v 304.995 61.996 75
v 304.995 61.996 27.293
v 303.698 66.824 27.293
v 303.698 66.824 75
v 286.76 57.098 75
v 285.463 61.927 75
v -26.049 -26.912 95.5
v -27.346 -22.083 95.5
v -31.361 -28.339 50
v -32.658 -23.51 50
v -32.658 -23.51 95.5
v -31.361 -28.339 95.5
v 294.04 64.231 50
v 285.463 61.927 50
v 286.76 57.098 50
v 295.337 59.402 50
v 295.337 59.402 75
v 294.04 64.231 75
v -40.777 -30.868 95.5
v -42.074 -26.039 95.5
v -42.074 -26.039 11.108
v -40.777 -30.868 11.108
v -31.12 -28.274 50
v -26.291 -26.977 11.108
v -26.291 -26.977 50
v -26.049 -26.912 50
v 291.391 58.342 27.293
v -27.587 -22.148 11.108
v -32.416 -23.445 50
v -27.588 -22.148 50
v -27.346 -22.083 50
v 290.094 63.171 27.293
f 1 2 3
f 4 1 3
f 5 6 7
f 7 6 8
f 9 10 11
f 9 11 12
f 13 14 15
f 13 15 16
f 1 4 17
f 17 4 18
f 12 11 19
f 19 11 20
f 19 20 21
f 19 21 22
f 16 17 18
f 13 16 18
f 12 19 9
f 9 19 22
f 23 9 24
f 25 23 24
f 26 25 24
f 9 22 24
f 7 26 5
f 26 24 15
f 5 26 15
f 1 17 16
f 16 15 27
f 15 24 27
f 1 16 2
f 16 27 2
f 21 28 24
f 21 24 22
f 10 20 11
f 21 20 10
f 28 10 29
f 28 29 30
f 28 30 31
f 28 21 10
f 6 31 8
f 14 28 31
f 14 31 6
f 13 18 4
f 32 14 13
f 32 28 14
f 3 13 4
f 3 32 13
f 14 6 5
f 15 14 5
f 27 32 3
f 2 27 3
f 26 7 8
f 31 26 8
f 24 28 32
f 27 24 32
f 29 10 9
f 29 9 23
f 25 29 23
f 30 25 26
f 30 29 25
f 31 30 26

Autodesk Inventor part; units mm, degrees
ref_plane "YZ Plane" through (0, 0, 0) normal (1, 0, 0) x (0, 1, 0)
ref_plane "XZ Plane" through (0, 0, 0) normal (0, 1, 0) x (-1, 0, 0)
sketch "Sketch1" plane through (0, 0, 0) normal (0, 0, 1) x (1, 0, 0)
  line L0 (-63.5719, 111.8382) -> (-7.6155, -96.5129) construction
  line L1 (-12.4444, -97.8098) -> (-68.7777, 111.945) construction
  line L2 (-42.0741, -26.0387) -> (-40.7772, -30.8676)
  line L3 (-40.7772, -30.8676) -> (304.995, 61.9956)
  line L4 (304.995, 61.9956) -> (303.6981, 66.8245)
  line L5 (-23.1781, -38.5663) -> (-40.7772, -30.8676) construction
  line L6 (247.1858, -96.9584) -> (307.8088, 111.597) construction
  line L7 (-42.0741, -26.0387) -> (-32.4163, -23.445) construction
  line L8 (294.0403, 64.2307) -> (303.6981, 66.8245) construction
  line L9 (-42.0741, -26.0387) -> (303.6981, 66.8245)
  point P0 (0, 0)
extrude "Extrusion1" add sketch "Sketch1" along normal blind 100
ref_plane "Work Plane1" through (0, 0, 50) normal (0, 0, 1) x (1, 0, 0)
sketch "Sketch3" plane through (0, 0, 100) normal (0, 0, 1) x (1, 0, 0)
  line L0 (302.6018, 111.597) -> (307.8088, 111.597) construction
  line L1 (302.6018, 111.597) -> (242.3845, -95.5627) construction
  line L2 (242.3845, -95.5627) -> (247.1858, -96.9584) construction
  line L3 (247.1858, -96.9584) -> (307.8088, 111.597) construction
  line L4 (-42.0741, -26.0387) -> (-40.7772, -30.8676) construction
  line L5 (-40.7772, -30.8676) -> (304.995, 61.9956) construction
  line L6 (304.995, 61.9956) -> (303.6981, 66.8245) construction
  line L7 (303.6981, 66.8245) -> (-42.0741, -26.0387) construction
  line L8 (285.4632, 61.9272) -> (286.7601, 57.0983)
  line L9 (286.7601, 57.0983) -> (295.3372, 59.4019)
  line L10 (295.3372, 59.4019) -> (294.0403, 64.2307)
  line L11 (294.0403, 64.2307) -> (285.4632, 61.9272)
  point P0 (0, 0)
extrude "Extrusion2" cut sketch "Sketch3" against normal up to surface (50 mm away)
sketch "Sketch4" plane through (0, 0, 100) normal (0, 0, 1) x (1, 0, 0)
  line L0 (286.7601, 57.0983) -> (285.4632, 61.9272) construction
  line L1 (285.4632, 61.9272) -> (-42.0741, -26.0387) construction
  line L2 (-42.0741, -26.0387) -> (-40.7772, -30.8676) construction
  line L3 (-40.7772, -30.8676) -> (286.7601, 57.0983) construction
  line L4 (-63.5719, 111.8382) -> (-68.7777, 111.945) construction
  line L5 (-12.4444, -97.8098) -> (-68.7777, 111.945) construction
  line L6 (-7.6155, -96.5129) -> (-12.4444, -97.8098) construction
  line L7 (-63.5719, 111.8382) -> (-7.6155, -96.5129) construction
  line L8 (-40.7772, -30.8676) -> (286.7601, 57.0983) construction
  line L9 (-32.4163, -23.445) -> (-31.1195, -28.2739)
  line L10 (-31.1195, -28.2739) -> (-26.2906, -26.977)
  line L11 (-26.2906, -26.977) -> (-27.5875, -22.1481)
  line L12 (-27.5875, -22.1481) -> (-32.4163, -23.445)
  line L13 (-32.6578, -23.5098) -> (-31.3609, -28.3387)
  line L14 (-31.3609, -28.3387) -> (-26.0491, -26.9121)
  line L15 (-26.0491, -26.9121) -> (-27.346, -22.0832)
  line L16 (-27.346, -22.0832) -> (-32.6578, -23.5098)
  line L17 (285.4632, 61.9272) -> (-42.0741, -26.0387) projected
  point P0 (0, 0)
  point P1 (-28.705, -27.6254)
  dimension "d21" = 5.5
extrude "Extrusion3" cut sketch "Sketch4" against normal up to surface (50 mm away)
ref_plane "Work Plane2" through (315.6821, 138.6828, 40.9) normal (0.0484699, 0.1667464, -0.9848078) x (-0.9602541, 0.2791272, 0)
ref_plane "Work Plane3" through (238.7196, -108.8102, 126.4793) normal (0, 0, -1) x (0, 1, 0)
sketch "Sketch6" plane through (303.6981, 66.8245, 100) normal (-0.2593763, 0.9657763, 0) x (0.9657763, 0.2593763, 0)
  line L0 (-348.2751, 50) -> (-342.7751, 50) construction
  line L1 (-18.881, 0) -> (-342.7751, 0) construction
  line L2 (-18.881, 0) -> (-18.881, 50) construction
  line L3 (-18.881, 50) -> (-10, 50) construction
  line L4 (-10, 50) -> (-10, 0) construction
  line L5 (0, 0) -> (-10, 0) construction
  line L6 (0, 100) -> (0, 0) construction
  line L7 (0, 100) -> (-358.0251, 100) construction
  line L8 (-358.0251, 100) -> (-358.0251, 0) construction
  line L9 (-14.0857, 72.7069) -> (0, 72.7069)
  line L10 (0, 100) -> (0, 0) construction
  line L11 (0, 72.7069) -> (0, 100)
  line L12 (-358.0251, 100) -> (0, 100) projected
  line L13 (0, 100) -> (-358.0251, 100)
  line L14 (-358.0251, 100) -> (-358.0251, 88.8925)
  line L15 (-358.0251, 100) -> (-358.0251, 0) construction
  line L16 (-343.0251, 88.8925) -> (-358.0251, 88.8925)
  line L17 (-343.0251, 88.8925) -> (-14.0857, 72.7069)
  line L18 (-358.0251, 100) -> (-358.0251, 0) construction
  line L19 (-342.7751, 50) -> (-342.7751, 0) projected
  line L20 (-348.2751, 0) -> (-358.0251, 0) projected
  line L21 (-348.2751, 0) -> (-348.2751, 50) projected
  point P0 (-310.6371, 100)
extrude "Extrusion5" cut sketch "Sketch6" against normal through all
sketch "Sketch7" plane through (285.4632, 61.9272, 100) normal (-0.2593763, 0.9657763, 0) x (0.9657763, 0.2593763, 0)
  line L0 (18.881, 72.7069) -> (18.881, 0) construction
  line L1 (-339.1441, 88.8925) -> (-339.1441, 0) construction
  line L2 (-323.8941, 4.5) -> (-339.1441, 4.5)
  line L3 (-339.1441, 4.5) -> (-339.1441, 0)
  line L4 (-339.1441, 0) -> (18.881, 0) projected
  line L5 (-339.1441, 0) -> (18.881, 0)
  line L6 (8.881, 0) -> (18.881, 0) projected
  line L7 (18.881, 0) -> (18.881, 25)
  line L8 (0, 0) -> (0, 50) construction
  line L9 (18.881, 25) -> (0, 25)
  line L10 (0, 25) -> (-323.8941, 4.5)
  line L11 (0, 50) -> (8.881, 50) construction
  line L12 (-323.8941, 50) -> (-323.8941, 0) construction
  point P0 (-291.7561, 100)
  dimension "d17" = 25
  dimension "d18" = 4.5
ref_plane "Work Plane4" through (315.6821, 138.6828, 45.9) normal (0.9602541, -0.2791272, 0) x (0.2791272, 0.9602541, 0)
sketch "Sketch8" plane through (315.6821, 138.6828, 45.9) normal (0.9602541, -0.2791272, 0) x (0.2791272, 0.9602541, 0)
  line L0 (-245.3946, 71.5637) -> (-28.2069, 15.6815) construction
  line L1 (-82.1398, 54.1) -> (-82.1398, 4.1) construction
  point P0 (-221.2862, -45.9)
  point P1 (-82.1398, 29.5584)
  dimension "d16" = 25.4584
ref_plane "Work Plane5" through (-76.0939, 139.1865, 45.8) normal (-0.9657763, -0.2593763, 0) x (-0.2593763, 0.9657763, 0)
extrude "Extrusion6" cut sketch "Sketch7" against normal through all
properties part number "brace"
